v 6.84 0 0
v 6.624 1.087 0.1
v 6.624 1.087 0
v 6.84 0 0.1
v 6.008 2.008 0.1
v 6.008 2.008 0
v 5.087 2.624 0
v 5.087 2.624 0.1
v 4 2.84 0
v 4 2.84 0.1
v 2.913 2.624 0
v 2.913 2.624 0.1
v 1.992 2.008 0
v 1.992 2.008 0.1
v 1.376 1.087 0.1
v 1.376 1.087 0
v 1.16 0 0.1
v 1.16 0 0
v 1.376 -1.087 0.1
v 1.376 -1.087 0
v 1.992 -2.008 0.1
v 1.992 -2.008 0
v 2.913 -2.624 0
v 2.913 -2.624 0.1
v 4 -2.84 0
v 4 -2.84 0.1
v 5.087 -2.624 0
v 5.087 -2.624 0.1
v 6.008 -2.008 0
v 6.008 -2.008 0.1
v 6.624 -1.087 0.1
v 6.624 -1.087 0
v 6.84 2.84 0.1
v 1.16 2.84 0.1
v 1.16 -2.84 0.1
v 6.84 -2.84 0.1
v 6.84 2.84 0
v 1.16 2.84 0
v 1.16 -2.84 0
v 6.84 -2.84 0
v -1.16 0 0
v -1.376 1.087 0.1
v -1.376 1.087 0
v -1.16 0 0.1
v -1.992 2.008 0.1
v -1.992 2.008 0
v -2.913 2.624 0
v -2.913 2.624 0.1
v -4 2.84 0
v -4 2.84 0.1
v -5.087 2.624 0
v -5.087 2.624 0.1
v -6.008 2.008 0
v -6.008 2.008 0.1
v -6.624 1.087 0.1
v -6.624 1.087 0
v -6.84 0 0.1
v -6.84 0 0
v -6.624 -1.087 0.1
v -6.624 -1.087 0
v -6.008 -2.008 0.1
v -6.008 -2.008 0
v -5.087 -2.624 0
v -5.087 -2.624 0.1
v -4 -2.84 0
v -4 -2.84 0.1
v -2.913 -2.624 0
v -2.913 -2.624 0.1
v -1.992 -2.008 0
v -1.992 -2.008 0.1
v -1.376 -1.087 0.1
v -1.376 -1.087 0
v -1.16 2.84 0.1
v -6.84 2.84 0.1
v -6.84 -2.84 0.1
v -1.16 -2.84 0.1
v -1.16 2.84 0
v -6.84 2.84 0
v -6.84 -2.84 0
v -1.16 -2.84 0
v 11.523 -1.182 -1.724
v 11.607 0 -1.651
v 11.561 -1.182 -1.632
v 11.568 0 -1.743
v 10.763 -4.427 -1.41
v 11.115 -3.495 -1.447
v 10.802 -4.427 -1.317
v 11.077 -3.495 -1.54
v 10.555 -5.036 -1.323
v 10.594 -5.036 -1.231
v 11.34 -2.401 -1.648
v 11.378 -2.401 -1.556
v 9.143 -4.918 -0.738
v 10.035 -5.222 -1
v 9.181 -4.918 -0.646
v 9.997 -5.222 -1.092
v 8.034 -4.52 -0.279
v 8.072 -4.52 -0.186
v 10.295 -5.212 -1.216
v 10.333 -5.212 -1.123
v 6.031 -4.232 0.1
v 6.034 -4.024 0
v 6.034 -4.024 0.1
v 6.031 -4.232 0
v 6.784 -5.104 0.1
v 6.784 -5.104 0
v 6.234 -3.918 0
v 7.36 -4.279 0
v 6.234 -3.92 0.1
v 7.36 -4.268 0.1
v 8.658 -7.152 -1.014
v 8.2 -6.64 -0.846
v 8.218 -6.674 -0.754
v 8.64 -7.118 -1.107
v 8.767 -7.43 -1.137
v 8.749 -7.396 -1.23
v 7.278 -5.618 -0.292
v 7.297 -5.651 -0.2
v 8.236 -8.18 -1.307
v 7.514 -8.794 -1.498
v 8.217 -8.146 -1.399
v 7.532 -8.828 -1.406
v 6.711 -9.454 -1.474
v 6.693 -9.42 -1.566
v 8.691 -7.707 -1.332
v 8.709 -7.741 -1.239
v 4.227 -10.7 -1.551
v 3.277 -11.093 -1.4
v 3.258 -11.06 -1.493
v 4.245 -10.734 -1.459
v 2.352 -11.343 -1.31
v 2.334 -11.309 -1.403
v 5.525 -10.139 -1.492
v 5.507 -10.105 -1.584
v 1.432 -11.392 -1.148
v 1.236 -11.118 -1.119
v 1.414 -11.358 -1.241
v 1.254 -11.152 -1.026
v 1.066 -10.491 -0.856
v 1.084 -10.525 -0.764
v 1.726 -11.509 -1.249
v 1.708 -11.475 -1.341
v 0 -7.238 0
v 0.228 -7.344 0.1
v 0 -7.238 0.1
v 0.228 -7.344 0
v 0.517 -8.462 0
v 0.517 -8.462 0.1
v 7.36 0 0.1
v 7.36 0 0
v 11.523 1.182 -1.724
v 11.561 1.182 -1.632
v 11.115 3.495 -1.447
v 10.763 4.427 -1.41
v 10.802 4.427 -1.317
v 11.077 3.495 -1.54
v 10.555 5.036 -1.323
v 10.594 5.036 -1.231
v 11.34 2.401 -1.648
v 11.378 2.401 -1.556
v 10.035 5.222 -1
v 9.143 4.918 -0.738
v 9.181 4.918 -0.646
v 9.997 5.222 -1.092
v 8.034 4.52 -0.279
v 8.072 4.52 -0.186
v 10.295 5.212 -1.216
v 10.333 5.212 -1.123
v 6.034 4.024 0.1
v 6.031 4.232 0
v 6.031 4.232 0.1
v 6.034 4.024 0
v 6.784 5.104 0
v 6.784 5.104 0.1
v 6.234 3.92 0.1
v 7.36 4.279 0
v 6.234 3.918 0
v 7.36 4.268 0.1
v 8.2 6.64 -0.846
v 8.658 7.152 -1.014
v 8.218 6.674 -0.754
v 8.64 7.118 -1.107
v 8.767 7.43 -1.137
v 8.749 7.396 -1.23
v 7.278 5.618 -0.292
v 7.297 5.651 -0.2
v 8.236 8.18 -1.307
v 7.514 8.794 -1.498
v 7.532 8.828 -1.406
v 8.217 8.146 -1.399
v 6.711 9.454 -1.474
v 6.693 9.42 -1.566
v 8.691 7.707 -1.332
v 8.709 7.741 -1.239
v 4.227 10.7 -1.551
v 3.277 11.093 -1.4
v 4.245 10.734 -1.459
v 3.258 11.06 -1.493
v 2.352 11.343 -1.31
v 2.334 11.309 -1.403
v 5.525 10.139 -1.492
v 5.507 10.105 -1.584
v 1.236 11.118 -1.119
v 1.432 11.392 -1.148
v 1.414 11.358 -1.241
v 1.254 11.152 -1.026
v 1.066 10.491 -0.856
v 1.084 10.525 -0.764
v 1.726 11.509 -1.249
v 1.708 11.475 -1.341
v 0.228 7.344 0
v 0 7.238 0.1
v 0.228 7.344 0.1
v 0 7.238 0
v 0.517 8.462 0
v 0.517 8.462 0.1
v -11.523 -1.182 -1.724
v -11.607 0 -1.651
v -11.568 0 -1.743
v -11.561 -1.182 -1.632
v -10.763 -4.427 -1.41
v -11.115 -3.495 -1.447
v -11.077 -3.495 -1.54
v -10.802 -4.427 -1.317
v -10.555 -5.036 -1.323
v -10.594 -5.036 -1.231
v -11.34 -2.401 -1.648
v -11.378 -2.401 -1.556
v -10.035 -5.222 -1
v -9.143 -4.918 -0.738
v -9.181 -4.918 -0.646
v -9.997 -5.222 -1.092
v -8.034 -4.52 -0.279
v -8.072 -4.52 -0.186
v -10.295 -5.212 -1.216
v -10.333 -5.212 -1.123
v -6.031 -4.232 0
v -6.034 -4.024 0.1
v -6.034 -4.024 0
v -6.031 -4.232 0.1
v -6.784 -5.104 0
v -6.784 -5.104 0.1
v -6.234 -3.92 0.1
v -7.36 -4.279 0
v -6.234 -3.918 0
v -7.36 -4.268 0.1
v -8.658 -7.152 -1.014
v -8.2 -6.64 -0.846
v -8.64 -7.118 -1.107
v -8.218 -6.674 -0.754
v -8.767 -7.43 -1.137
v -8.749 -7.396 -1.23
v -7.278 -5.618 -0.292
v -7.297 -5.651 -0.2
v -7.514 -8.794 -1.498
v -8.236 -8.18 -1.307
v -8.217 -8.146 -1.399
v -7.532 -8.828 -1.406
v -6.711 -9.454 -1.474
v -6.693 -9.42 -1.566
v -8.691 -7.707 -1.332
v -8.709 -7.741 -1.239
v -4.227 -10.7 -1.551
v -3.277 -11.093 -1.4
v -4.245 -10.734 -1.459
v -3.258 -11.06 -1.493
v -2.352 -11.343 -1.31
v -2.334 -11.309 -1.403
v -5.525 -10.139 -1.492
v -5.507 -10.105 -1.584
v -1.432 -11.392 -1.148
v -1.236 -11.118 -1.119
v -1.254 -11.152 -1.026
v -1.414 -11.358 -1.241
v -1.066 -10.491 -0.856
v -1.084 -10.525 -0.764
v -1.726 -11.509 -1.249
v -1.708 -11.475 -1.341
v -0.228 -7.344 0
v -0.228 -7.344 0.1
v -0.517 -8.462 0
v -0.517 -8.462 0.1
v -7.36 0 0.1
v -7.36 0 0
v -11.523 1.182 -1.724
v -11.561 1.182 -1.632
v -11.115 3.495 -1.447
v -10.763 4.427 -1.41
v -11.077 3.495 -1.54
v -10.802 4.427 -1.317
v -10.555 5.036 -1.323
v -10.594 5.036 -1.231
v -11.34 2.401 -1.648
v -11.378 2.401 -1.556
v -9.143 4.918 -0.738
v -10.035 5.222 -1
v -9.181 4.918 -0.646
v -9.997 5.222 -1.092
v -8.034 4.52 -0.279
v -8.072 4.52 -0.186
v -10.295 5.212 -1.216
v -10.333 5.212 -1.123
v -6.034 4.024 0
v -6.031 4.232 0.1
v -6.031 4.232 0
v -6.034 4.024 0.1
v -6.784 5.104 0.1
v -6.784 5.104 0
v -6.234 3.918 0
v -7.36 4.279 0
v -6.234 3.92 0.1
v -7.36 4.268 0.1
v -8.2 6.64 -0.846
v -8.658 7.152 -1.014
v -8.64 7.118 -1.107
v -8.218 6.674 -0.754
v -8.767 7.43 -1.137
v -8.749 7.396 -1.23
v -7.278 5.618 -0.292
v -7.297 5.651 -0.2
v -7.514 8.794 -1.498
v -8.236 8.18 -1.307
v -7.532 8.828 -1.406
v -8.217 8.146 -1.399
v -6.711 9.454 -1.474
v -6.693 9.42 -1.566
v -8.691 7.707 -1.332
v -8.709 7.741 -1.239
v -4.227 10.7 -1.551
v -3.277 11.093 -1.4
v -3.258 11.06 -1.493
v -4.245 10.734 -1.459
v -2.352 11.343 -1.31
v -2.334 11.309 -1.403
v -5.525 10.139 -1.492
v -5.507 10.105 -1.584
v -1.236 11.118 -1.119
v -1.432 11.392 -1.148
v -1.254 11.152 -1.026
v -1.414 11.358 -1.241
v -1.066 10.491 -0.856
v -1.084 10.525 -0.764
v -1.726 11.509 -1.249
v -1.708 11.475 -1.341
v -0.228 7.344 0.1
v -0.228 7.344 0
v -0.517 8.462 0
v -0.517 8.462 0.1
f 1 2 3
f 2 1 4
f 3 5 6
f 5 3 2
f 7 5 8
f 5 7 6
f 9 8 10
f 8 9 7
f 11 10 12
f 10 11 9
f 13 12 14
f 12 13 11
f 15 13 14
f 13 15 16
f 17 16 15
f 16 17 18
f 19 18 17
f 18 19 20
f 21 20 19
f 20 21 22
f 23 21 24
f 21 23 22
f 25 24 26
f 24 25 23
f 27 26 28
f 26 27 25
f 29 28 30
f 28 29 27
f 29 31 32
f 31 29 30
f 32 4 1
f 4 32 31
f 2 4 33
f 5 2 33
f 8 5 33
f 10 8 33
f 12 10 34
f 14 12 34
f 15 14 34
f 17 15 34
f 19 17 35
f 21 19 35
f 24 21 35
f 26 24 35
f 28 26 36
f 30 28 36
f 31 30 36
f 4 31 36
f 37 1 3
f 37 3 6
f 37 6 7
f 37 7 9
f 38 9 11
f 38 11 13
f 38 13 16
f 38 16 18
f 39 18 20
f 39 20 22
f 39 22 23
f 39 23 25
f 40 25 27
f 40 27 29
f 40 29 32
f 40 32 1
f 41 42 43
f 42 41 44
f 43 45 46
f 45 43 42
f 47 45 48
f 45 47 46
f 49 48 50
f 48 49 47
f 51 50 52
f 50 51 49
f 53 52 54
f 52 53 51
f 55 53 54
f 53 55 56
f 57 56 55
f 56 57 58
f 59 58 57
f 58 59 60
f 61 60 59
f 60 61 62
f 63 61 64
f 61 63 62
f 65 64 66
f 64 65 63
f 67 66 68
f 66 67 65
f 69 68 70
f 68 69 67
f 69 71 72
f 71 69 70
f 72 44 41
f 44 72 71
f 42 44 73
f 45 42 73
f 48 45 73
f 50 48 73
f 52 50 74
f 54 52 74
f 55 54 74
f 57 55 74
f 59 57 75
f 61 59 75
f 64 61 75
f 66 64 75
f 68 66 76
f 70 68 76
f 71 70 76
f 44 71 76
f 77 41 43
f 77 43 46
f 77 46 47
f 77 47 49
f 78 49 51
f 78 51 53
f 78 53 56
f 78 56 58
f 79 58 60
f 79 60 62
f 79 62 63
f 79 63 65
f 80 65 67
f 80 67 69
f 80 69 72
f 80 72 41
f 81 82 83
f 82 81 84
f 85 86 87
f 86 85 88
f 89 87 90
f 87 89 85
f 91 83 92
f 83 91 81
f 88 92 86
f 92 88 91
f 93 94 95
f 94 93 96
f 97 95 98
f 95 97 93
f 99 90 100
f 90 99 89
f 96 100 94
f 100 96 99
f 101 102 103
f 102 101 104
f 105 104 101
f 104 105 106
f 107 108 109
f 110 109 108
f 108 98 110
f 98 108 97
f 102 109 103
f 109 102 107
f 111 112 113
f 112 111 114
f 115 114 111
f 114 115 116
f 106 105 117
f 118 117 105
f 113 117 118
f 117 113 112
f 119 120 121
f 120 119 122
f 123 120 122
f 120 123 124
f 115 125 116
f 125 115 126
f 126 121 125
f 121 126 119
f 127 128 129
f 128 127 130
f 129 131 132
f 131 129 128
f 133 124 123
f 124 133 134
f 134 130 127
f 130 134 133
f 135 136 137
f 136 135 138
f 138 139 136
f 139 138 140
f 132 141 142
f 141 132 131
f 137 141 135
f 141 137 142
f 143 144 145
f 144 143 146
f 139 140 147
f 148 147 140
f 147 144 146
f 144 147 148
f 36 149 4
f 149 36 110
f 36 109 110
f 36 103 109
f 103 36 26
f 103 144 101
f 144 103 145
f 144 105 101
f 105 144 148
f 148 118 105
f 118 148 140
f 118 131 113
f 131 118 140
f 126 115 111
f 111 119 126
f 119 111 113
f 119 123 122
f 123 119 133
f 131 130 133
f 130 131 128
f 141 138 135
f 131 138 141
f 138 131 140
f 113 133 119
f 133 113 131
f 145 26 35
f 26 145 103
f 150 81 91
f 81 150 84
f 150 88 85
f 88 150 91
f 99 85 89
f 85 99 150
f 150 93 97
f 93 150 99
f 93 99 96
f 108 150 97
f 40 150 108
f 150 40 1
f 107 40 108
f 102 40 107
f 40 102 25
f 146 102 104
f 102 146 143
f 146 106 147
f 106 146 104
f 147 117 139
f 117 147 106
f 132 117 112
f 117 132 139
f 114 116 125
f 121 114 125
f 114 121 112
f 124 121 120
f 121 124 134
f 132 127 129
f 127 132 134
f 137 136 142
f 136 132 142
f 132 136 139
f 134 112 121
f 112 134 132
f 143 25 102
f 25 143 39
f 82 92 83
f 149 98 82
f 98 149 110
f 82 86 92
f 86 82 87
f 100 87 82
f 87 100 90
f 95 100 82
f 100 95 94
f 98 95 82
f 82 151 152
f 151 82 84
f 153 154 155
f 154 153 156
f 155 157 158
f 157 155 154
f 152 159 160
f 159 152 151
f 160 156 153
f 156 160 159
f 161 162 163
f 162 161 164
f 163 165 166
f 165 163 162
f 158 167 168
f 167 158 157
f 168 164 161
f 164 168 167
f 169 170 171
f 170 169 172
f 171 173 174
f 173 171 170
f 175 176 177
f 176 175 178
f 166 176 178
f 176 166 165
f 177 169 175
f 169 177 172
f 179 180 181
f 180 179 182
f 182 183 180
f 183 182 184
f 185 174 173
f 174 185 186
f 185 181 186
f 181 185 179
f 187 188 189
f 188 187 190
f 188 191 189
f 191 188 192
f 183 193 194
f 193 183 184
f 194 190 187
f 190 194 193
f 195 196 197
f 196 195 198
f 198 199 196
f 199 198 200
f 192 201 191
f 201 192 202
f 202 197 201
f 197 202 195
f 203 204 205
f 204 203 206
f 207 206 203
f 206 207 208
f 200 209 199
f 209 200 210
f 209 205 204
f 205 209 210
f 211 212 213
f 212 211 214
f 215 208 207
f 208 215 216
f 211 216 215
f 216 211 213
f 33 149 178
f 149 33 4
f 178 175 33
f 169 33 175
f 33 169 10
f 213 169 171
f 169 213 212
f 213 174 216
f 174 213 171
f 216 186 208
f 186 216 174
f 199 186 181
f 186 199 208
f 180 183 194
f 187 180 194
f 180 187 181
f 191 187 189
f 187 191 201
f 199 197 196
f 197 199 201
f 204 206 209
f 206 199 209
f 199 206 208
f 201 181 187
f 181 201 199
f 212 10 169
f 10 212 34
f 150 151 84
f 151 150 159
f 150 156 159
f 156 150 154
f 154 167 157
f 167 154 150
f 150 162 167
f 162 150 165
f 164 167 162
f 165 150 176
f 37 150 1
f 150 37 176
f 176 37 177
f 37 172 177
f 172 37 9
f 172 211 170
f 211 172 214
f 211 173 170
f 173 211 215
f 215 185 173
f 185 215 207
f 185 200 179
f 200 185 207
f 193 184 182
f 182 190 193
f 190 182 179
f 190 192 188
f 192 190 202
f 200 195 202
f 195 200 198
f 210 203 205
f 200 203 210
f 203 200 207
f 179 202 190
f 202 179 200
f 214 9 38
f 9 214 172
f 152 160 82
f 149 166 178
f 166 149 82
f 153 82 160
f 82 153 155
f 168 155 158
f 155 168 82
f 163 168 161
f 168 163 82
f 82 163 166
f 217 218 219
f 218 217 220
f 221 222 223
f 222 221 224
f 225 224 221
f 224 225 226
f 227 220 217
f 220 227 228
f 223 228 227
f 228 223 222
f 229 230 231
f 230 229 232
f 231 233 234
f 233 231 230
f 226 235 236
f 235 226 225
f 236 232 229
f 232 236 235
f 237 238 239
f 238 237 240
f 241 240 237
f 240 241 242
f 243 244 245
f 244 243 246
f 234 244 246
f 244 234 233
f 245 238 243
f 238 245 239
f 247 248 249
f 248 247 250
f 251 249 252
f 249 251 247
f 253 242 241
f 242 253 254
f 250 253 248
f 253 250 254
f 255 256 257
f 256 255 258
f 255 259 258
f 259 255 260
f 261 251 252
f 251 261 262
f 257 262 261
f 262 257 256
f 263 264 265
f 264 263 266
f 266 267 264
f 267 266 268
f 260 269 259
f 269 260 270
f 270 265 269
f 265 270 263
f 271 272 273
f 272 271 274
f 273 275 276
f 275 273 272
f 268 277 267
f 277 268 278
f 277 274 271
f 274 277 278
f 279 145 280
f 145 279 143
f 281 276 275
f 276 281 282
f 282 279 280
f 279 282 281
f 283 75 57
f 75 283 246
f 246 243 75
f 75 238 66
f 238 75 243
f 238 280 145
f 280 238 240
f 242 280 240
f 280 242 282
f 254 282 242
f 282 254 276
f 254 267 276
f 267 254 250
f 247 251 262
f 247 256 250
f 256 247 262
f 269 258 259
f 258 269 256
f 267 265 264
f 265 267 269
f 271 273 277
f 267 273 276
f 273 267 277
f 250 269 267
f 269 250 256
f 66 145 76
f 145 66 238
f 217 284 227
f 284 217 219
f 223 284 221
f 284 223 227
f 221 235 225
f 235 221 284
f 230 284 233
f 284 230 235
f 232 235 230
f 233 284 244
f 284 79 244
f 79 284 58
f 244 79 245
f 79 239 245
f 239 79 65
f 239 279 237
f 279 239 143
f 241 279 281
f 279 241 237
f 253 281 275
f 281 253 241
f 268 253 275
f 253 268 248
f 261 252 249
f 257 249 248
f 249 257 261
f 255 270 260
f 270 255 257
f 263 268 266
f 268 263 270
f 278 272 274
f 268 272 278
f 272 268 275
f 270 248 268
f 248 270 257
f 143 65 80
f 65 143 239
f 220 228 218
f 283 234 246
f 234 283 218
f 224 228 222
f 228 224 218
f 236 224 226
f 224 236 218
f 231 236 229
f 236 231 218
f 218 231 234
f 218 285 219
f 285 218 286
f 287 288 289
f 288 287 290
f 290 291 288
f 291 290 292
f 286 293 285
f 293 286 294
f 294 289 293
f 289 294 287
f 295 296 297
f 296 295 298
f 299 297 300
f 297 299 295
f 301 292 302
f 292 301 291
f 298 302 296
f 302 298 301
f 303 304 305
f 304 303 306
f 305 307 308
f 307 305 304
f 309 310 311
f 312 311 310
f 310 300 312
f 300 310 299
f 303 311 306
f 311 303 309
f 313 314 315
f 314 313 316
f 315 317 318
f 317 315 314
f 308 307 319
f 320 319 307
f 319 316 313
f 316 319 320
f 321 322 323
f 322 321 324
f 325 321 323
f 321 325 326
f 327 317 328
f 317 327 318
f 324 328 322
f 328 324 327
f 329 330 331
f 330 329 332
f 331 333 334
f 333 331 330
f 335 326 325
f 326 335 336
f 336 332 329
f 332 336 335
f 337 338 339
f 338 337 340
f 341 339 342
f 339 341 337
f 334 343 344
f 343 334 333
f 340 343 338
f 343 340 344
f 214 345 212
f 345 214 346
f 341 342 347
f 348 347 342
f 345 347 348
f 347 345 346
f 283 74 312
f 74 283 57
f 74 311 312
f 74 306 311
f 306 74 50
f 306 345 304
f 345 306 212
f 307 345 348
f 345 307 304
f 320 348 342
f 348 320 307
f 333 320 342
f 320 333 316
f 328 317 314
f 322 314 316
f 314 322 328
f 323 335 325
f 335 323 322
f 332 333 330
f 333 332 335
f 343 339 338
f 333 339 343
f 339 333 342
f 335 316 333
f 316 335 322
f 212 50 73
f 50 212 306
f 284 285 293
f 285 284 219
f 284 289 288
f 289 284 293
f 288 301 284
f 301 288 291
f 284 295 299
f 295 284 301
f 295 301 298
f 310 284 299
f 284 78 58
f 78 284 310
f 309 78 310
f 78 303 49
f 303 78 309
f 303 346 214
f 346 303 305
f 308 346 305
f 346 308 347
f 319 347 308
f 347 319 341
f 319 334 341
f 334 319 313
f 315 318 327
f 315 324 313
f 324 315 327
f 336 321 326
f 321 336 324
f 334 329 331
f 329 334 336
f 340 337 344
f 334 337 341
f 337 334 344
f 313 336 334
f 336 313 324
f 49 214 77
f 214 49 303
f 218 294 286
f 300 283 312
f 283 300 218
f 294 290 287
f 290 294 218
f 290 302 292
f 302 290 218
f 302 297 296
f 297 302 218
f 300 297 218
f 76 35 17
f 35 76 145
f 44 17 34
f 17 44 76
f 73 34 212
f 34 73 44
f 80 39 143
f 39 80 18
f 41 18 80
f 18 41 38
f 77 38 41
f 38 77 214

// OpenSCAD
// file: ../p/4-4edge.scad
use <../lib.scad>
function ldraw_lib__4_4edge() = [
// 0 Circle 1.0
// 0 Name: 4-4edge.dat
// 0 Author: James Jessiman
// 0 !LDRAW_ORG Primitive UPDATE 2017-01
// 0 !LICENSE Licensed under CC BY 4.0 : see CAreadme.txt
// 
// 0 BFC CERTIFY CCW
  [0,"BFC","CERTIFY"],
  [0,"BFC","CCW"],
// 
// 0 !HISTORY 1998-12-15 [PTadmin] Official Update 1998-10
// 0 !HISTORY 2005-12-28 [PTadmin] Official Update 2005-01
// 0 !HISTORY 2007-06-24 [PTadmin] Header formatted for Contributor Agreement
// 0 !HISTORY 2008-07-01 [PTadmin] Official Update 2008-01
// 0 !HISTORY 2017-01-15 [Steffen] BFCed
// 0 !HISTORY 2017-12-30 [PTadmin] Official Update 2017-01
// 
// 
// 2 24 1 0 0 0.9239 0 0.3827
  [2,24,1,0,0,0.9239,0,0.3827],
// 2 24 0.9239 0 0.3827 0.7071 0 0.7071
  [2,24,0.9239,0,0.3827,0.7071,0,0.7071],
// 2 24 0.7071 0 0.7071 0.3827 0 0.9239
  [2,24,0.7071,0,0.7071,0.3827,0,0.9239],
// 2 24 0.3827 0 0.9239 0 0 1
  [2,24,0.3827,0,0.9239,0,0,1],
// 2 24 0 0 1 -0.3827 0 0.9239
  [2,24,0,0,1,-0.3827,0,0.9239],
// 2 24 -0.3827 0 0.9239 -0.7071 0 0.7071
  [2,24,-0.3827,0,0.9239,-0.7071,0,0.7071],
// 2 24 -0.7071 0 0.7071 -0.9239 0 0.3827
  [2,24,-0.7071,0,0.7071,-0.9239,0,0.3827],
// 2 24 -0.9239 0 0.3827 -1 0 -0
  [2,24,-0.9239,0,0.3827,-1,0,-0],
// 2 24 -1 0 -0 -0.9239 0 -0.3827
  [2,24,-1,0,-0,-0.9239,0,-0.3827],
// 2 24 -0.9239 0 -0.3827 -0.7071 0 -0.7071
  [2,24,-0.9239,0,-0.3827,-0.7071,0,-0.7071],
// 2 24 -0.7071 0 -0.7071 -0.3827 0 -0.9239
  [2,24,-0.7071,0,-0.7071,-0.3827,0,-0.9239],
// 2 24 -0.3827 0 -0.9239 0 0 -1
  [2,24,-0.3827,0,-0.9239,0,0,-1],
// 2 24 0 0 -1 0.3827 0 -0.9239
  [2,24,0,0,-1,0.3827,0,-0.9239],
// 2 24 0.3827 0 -0.9239 0.7071 0 -0.7071
  [2,24,0.3827,0,-0.9239,0.7071,0,-0.7071],
// 2 24 0.7071 0 -0.7071 0.9239 0 -0.3827
  [2,24,0.7071,0,-0.7071,0.9239,0,-0.3827],
// 2 24 0.9239 0 -0.3827 1 0 0
  [2,24,0.9239,0,-0.3827,1,0,0],
];
module ldraw_lib__4_4edge(step=0, col=false, unit=2/5, alt=false, line=0.2, solid=!$preview)
    makepoly(ldraw_lib__4_4edge(), step=step, col=col, unit=unit, alt=alt, line=line, solid=solid);
ldraw_lib__4_4edge(line=0.2);
// file: ../p/4-4cyli.scad
use <../lib.scad>
function ldraw_lib__4_4cyli() = [
// 0 Cylinder 1.0
// 0 Name: 4-4cyli.dat
// 0 Author: James Jessiman
// 0 !LDRAW_ORG Primitive UPDATE 2005-01
// 0 !LICENSE Licensed under CC BY 4.0 : see CAreadme.txt
// 
// 0 BFC CERTIFY CCW
  [0,"BFC","CERTIFY"],
  [0,"BFC","CCW"],
// 
// 0 !HISTORY 1998-12-15 [PTadmin] Official Update 1998-10
// 0 !HISTORY 2002-03-23 [sbliss] Added BFC statement; merged headers from files in distributions LDraw 0.27 and Complete.
// 0 !HISTORY 2002-04-25 [PTadmin] Official Update 2002-02
// 0 !HISTORY 2004-12-14 [guyvivan] BFC CCW
// 0 !HISTORY 2005-12-28 [PTadmin] Official Update 2005-01
// 0 !HISTORY 2007-06-24 [PTadmin] Header formatted for Contributor Agreement
// 0 !HISTORY 2008-07-01 [PTadmin] Official Update 2008-01
// 
// 
// 4 16 1 1 0 0.9239 1 0.3827 0.9239 0 0.3827 1 0 0
  [4,16,1,1,0,0.9239,1,0.3827,0.9239,0,0.3827,1,0,0],
// 5 24 1 0 0 1 1 0 0.9239 0 0.3827 0.9239 0 -0.3827
  [5,24,1,0,0,1,1,0,0.9239,0,0.3827,0.9239,0,-0.3827],
// 4 16 0.9239 1 0.3827 0.7071 1 0.7071 0.7071 0 0.7071 0.9239 0 0.3827
  [4,16,0.9239,1,0.3827,0.7071,1,0.7071,0.7071,0,0.7071,0.9239,0,0.3827],
// 5 24 0.9239 0 0.3827 0.9239 1 0.3827 0.7071 0 0.7071 1 0 0
  [5,24,0.9239,0,0.3827,0.9239,1,0.3827,0.7071,0,0.7071,1,0,0],
// 4 16 0.7071 1 0.7071 0.3827 1 0.9239 0.3827 0 0.9239 0.7071 0 0.7071
  [4,16,0.7071,1,0.7071,0.3827,1,0.9239,0.3827,0,0.9239,0.7071,0,0.7071],
// 5 24 0.7071 0 0.7071 0.7071 1 0.7071 0.3827 0 0.9239 0.9239 0 0.3827
  [5,24,0.7071,0,0.7071,0.7071,1,0.7071,0.3827,0,0.9239,0.9239,0,0.3827],
// 4 16 0.3827 1 0.9239 0 1 1 0 0 1 0.3827 0 0.9239
  [4,16,0.3827,1,0.9239,0,1,1,0,0,1,0.3827,0,0.9239],
// 5 24 0.3827 0 0.9239 0.3827 1 0.9239 0 0 1 0.7071 0 0.7071
  [5,24,0.3827,0,0.9239,0.3827,1,0.9239,0,0,1,0.7071,0,0.7071],
// 4 16 0 1 1 -0.3827 1 0.9239 -0.3827 0 0.9239 0 0 1
  [4,16,0,1,1,-0.3827,1,0.9239,-0.3827,0,0.9239,0,0,1],
// 5 24 0 0 1 0 1 1 -0.3827 0 0.9239 0.3827 0 0.9239
  [5,24,0,0,1,0,1,1,-0.3827,0,0.9239,0.3827,0,0.9239],
// 4 16 -0.3827 1 0.9239 -0.7071 1 0.7071 -0.7071 0 0.7071 -0.3827 0 0.9239
  [4,16,-0.3827,1,0.9239,-0.7071,1,0.7071,-0.7071,0,0.7071,-0.3827,0,0.9239],
// 5 24 -0.3827 0 0.9239 -0.3827 1 0.9239 -0.7071 0 0.7071 0 0 1
  [5,24,-0.3827,0,0.9239,-0.3827,1,0.9239,-0.7071,0,0.7071,0,0,1],
// 4 16 -0.7071 1 0.7071 -0.9239 1 0.3827 -0.9239 0 0.3827 -0.7071 0 0.7071
  [4,16,-0.7071,1,0.7071,-0.9239,1,0.3827,-0.9239,0,0.3827,-0.7071,0,0.7071],
// 5 24 -0.7071 0 0.7071 -0.7071 1 0.7071 -0.9239 0 0.3827 -0.3827 0 0.9239
  [5,24,-0.7071,0,0.7071,-0.7071,1,0.7071,-0.9239,0,0.3827,-0.3827,0,0.9239],
// 4 16 -0.9239 1 0.3827 -1 1 0 -1 0 0 -0.9239 0 0.3827
  [4,16,-0.9239,1,0.3827,-1,1,0,-1,0,0,-0.9239,0,0.3827],
// 5 24 -0.9239 0 0.3827 -0.9239 1 0.3827 -1 0 0 -0.7071 0 0.7071
  [5,24,-0.9239,0,0.3827,-0.9239,1,0.3827,-1,0,0,-0.7071,0,0.7071],
// 4 16 -1 1 0 -0.9239 1 -0.3827 -0.9239 0 -0.3827 -1 0 0
  [4,16,-1,1,0,-0.9239,1,-0.3827,-0.9239,0,-0.3827,-1,0,0],
// 5 24 -1 0 0 -1 1 0 -0.9239 0 -0.3827 -0.9239 0 0.3827
  [5,24,-1,0,0,-1,1,0,-0.9239,0,-0.3827,-0.9239,0,0.3827],
// 4 16 -0.9239 1 -0.3827 -0.7071 1 -0.7071 -0.7071 0 -0.7071 -0.9239 0 -0.3827
  [4,16,-0.9239,1,-0.3827,-0.7071,1,-0.7071,-0.7071,0,-0.7071,-0.9239,0,-0.3827],
// 5 24 -0.9239 0 -0.3827 -0.9239 1 -0.3827 -0.7071 0 -0.7071 -1 0 0
  [5,24,-0.9239,0,-0.3827,-0.9239,1,-0.3827,-0.7071,0,-0.7071,-1,0,0],
// 4 16 -0.7071 1 -0.7071 -0.3827 1 -0.9239 -0.3827 0 -0.9239 -0.7071 0 -0.7071
  [4,16,-0.7071,1,-0.7071,-0.3827,1,-0.9239,-0.3827,0,-0.9239,-0.7071,0,-0.7071],
// 5 24 -0.7071 0 -0.7071 -0.7071 1 -0.7071 -0.3827 0 -0.9239 -0.9239 0 -0.3827
  [5,24,-0.7071,0,-0.7071,-0.7071,1,-0.7071,-0.3827,0,-0.9239,-0.9239,0,-0.3827],
// 4 16 -0.3827 1 -0.9239 0 1 -1 0 0 -1 -0.3827 0 -0.9239
  [4,16,-0.3827,1,-0.9239,0,1,-1,0,0,-1,-0.3827,0,-0.9239],
// 5 24 -0.3827 0 -0.9239 -0.3827 1 -0.9239 0 0 -1 -0.7071 0 -0.7071
  [5,24,-0.3827,0,-0.9239,-0.3827,1,-0.9239,0,0,-1,-0.7071,0,-0.7071],
// 4 16 0 1 -1 0.3827 1 -0.9239 0.3827 0 -0.9239 0 0 -1
  [4,16,0,1,-1,0.3827,1,-0.9239,0.3827,0,-0.9239,0,0,-1],
// 5 24 0 0 -1 0 1 -1 0.3827 0 -0.9239 -0.3827 0 -0.9239
  [5,24,0,0,-1,0,1,-1,0.3827,0,-0.9239,-0.3827,0,-0.9239],
// 4 16 0.3827 1 -0.9239 0.7071 1 -0.7071 0.7071 0 -0.7071 0.3827 0 -0.9239
  [4,16,0.3827,1,-0.9239,0.7071,1,-0.7071,0.7071,0,-0.7071,0.3827,0,-0.9239],
// 5 24 0.3827 0 -0.9239 0.3827 1 -0.9239 0.7071 0 -0.7071 0 0 -1
  [5,24,0.3827,0,-0.9239,0.3827,1,-0.9239,0.7071,0,-0.7071,0,0,-1],
// 4 16 0.7071 1 -0.7071 0.9239 1 -0.3827 0.9239 0 -0.3827 0.7071 0 -0.7071
  [4,16,0.7071,1,-0.7071,0.9239,1,-0.3827,0.9239,0,-0.3827,0.7071,0,-0.7071],
// 5 24 0.7071 0 -0.7071 0.7071 1 -0.7071 0.9239 0 -0.3827 0.3827 0 -0.9239
  [5,24,0.7071,0,-0.7071,0.7071,1,-0.7071,0.9239,0,-0.3827,0.3827,0,-0.9239],
// 4 16 0.9239 1 -0.3827 1 1 0 1 0 0 0.9239 0 -0.3827
  [4,16,0.9239,1,-0.3827,1,1,0,1,0,0,0.9239,0,-0.3827],
// 5 24 0.9239 0 -0.3827 0.9239 1 -0.3827 1 0 0 0.7071 0 -0.7071
  [5,24,0.9239,0,-0.3827,0.9239,1,-0.3827,1,0,0,0.7071,0,-0.7071],
// 0
];
module ldraw_lib__4_4cyli(step=0, col=false, unit=2/5, alt=false, line=0.2, solid=!$preview)
    makepoly(ldraw_lib__4_4cyli(), step=step, col=col, unit=unit, alt=alt, line=line, solid=solid);
ldraw_lib__4_4cyli(line=0.2);
// file: ../p/4-4ndis.scad
use <../lib.scad>
function ldraw_lib__4_4ndis() = [
// 0 Disc Negative 1.0
// 0 Name: 4-4ndis.dat
// 0 Author: James Jessiman
// 0 !LDRAW_ORG Primitive UPDATE 2012-01
// 0 !LICENSE Licensed under CC BY 4.0 : see CAreadme.txt
// 
// 0 BFC CERTIFY CCW
  [0,"BFC","CERTIFY"],
  [0,"BFC","CCW"],
// 
// 0 !HISTORY 2002-03-23 [sbliss] Added BFC statement; compacted code
// 0 !HISTORY 2002-04-25 [PTadmin] Official Update 2002-02
// 0 !HISTORY 2007-06-24 [PTadmin] Header formatted for Contributor Agreement
// 0 !HISTORY 2008-07-01 [PTadmin] Official Update 2008-01
// 0 !HISTORY 2012-02-16 [Philo] Changed to CCW
// 0 !HISTORY 2012-03-30 [PTadmin] Official Update 2012-01
// 
// 
// 3 16 0.9239 0 0.3827 1 0 0 1 0 1
  [3,16,0.9239,0,0.3827,1,0,0,1,0,1],
// 3 16 0.7071 0 0.7071 0.9239 0 0.3827 1 0 1
  [3,16,0.7071,0,0.7071,0.9239,0,0.3827,1,0,1],
// 3 16 0.3827 0 0.9239 0.7071 0 0.7071 1 0 1
  [3,16,0.3827,0,0.9239,0.7071,0,0.7071,1,0,1],
// 3 16 0 0 1 0.3827 0 0.9239 1 0 1
  [3,16,0,0,1,0.3827,0,0.9239,1,0,1],
// 3 16 -0.3827 0 0.9239 0 0 1 -1 0 1
  [3,16,-0.3827,0,0.9239,0,0,1,-1,0,1],
// 3 16 -0.7071 0 0.7071 -0.3827 0 0.9239 -1 0 1
  [3,16,-0.7071,0,0.7071,-0.3827,0,0.9239,-1,0,1],
// 3 16 -0.9239 0 0.3827 -0.7071 0 0.7071 -1 0 1
  [3,16,-0.9239,0,0.3827,-0.7071,0,0.7071,-1,0,1],
// 3 16 -1 0 0 -0.9239 0 0.3827 -1 0 1
  [3,16,-1,0,0,-0.9239,0,0.3827,-1,0,1],
// 3 16 -0.9239 0 -0.3827 -1 0 0 -1 0 -1
  [3,16,-0.9239,0,-0.3827,-1,0,0,-1,0,-1],
// 3 16 -0.7071 0 -0.7071 -0.9239 0 -0.3827 -1 0 -1
  [3,16,-0.7071,0,-0.7071,-0.9239,0,-0.3827,-1,0,-1],
// 3 16 -0.3827 0 -0.9239 -0.7071 0 -0.7071 -1 0 -1
  [3,16,-0.3827,0,-0.9239,-0.7071,0,-0.7071,-1,0,-1],
// 3 16 0 0 -1 -0.3827 0 -0.9239 -1 0 -1
  [3,16,0,0,-1,-0.3827,0,-0.9239,-1,0,-1],
// 3 16 0.3827 0 -0.9239 0 0 -1 1 0 -1
  [3,16,0.3827,0,-0.9239,0,0,-1,1,0,-1],
// 3 16 0.7071 0 -0.7071 0.3827 0 -0.9239 1 0 -1
  [3,16,0.7071,0,-0.7071,0.3827,0,-0.9239,1,0,-1],
// 3 16 0.9239 0 -0.3827 0.7071 0 -0.7071 1 0 -1
  [3,16,0.9239,0,-0.3827,0.7071,0,-0.7071,1,0,-1],
// 3 16 1 0 0 0.9239 0 -0.3827 1 0 -1
  [3,16,1,0,0,0.9239,0,-0.3827,1,0,-1],
];
module ldraw_lib__4_4ndis(step=0, col=false, unit=2/5, alt=false, line=0.2, solid=!$preview)
    makepoly(ldraw_lib__4_4ndis(), step=step, col=col, unit=unit, alt=alt, line=line, solid=solid);
ldraw_lib__4_4ndis(line=0.2);
// file: ../p/4-4cylo.scad
use <../lib.scad>
use <4-4cyli.scad>
use <4-4edge.scad>
function ldraw_lib__4_4cylo() = [
// 0 Cylinder Open 1.0
// 0 Name: 4-4cylo.dat
// 0 Author: Mark Kennedy [mkennedy]
// 0 !LDRAW_ORG Primitive UPDATE 2010-01
// 0 !LICENSE Licensed under CC BY 4.0 : see CAreadme.txt
// 
// 0 BFC CERTIFY CCW
  [0,"BFC","CERTIFY"],
  [0,"BFC","CCW"],
// 
// 0 !HISTORY 2010-04-05 [PTadmin] Official Update 2010-01
// 
// 
// 1 16 0 0 0 1 0 0 0 1 0 0 0 1 4-4edge.dat
  [1,16,0,0,0,1,0,0,0,1,0,0,0,1, ldraw_lib__4_4edge()],
// 1 16 0 1 0 1 0 0 0 1 0 0 0 1 4-4edge.dat
  [1,16,0,1,0,1,0,0,0,1,0,0,0,1, ldraw_lib__4_4edge()],
// 1 16 0 0 0 1 0 0 0 1 0 0 0 1 4-4cyli.dat
  [1,16,0,0,0,1,0,0,0,1,0,0,0,1, ldraw_lib__4_4cyli()],
// 0
];
module ldraw_lib__4_4cylo(step=0, col=false, unit=2/5, alt=false, line=0.2, solid=!$preview)
    makepoly(ldraw_lib__4_4cylo(), step=step, col=col, unit=unit, alt=alt, line=line, solid=solid);
ldraw_lib__4_4cylo(line=0.2);
// main file
use <../lib.scad>
use <../p/4-4cylo.scad>
use <../p/4-4ndis.scad>
use <s/75674c01s01.scad>
function ldraw_lib__75674c01() = [
// 0 Minifig Skirt Round Roman (Formed)
// 0 Name: 75674c01.dat
// 0 Author: Magnus Forsberg [MagFors]
// 0 !LDRAW_ORG Part UPDATE 2026-07
// 0 !LICENSE Licensed under CC BY 4.0 : see CAreadme.txt
// 
// 0 BFC CERTIFY CCW
  [0,"BFC","CERTIFY"],
  [0,"BFC","CCW"],
// 
// 0 !CATEGORY Minifig Hipwear
// 0 !KEYWORDS Bricklink 75674, Brickowl 79053, Brickset 75674, CMF, Looney Tunes
// 0 !KEYWORDS Marvin the Martian, Rebrickable 75674, Set 71030
// 
// 0 !HISTORY 2026-07-30 [OrionP] Official Update 2026-07
// 
// 0 BFC INVERTNEXT
  [0,"BFC","INVERTNEXT"],
// 1 16 10 -.25 0 7.1 0 0 0 .25 0 0 0 7.1 4-4cylo.dat
  [1,16,10,-.25,0,7.1,0,0,0,.25,0,0,0,7.1, ldraw_lib__4_4cylo()],
// 1 16 10 -.25 0 7.1 0 0 0 1 0 0 0 7.1 4-4ndis.dat
  [1,16,10,-.25,0,7.1,0,0,0,1,0,0,0,7.1, ldraw_lib__4_4ndis()],
// 1 16 10 0 0 7.1 0 0 0 -1 0 0 0 7.1 4-4ndis.dat
  [1,16,10,0,0,7.1,0,0,0,-1,0,0,0,7.1, ldraw_lib__4_4ndis()],
// 0 BFC INVERTNEXT
  [0,"BFC","INVERTNEXT"],
// 1 16 -10 -.25 0 7.1 0 0 0 .25 0 0 0 7.1 4-4cylo.dat
  [1,16,-10,-.25,0,7.1,0,0,0,.25,0,0,0,7.1, ldraw_lib__4_4cylo()],
// 1 16 -10 -.25 0 7.1 0 0 0 1 0 0 0 7.1 4-4ndis.dat
  [1,16,-10,-.25,0,7.1,0,0,0,1,0,0,0,7.1, ldraw_lib__4_4ndis()],
// 1 16 -10 0 0 7.1 0 0 0 -1 0 0 0 7.1 4-4ndis.dat
  [1,16,-10,0,0,7.1,0,0,0,-1,0,0,0,7.1, ldraw_lib__4_4ndis()],
// 1 16 0 0 0 1 0 0 0 1 0 0 0 1 s\75674c01s01.dat
  [1,16,0,0,0,1,0,0,0,1,0,0,0,1, ldraw_lib__s__75674c01s01()],
// 1 16 0 0 0 1 0 0 0 1 0 0 0 -1 s\75674c01s01.dat
  [1,16,0,0,0,1,0,0,0,1,0,0,0,-1, ldraw_lib__s__75674c01s01()],
// 1 16 0 0 0 -1 0 0 0 1 0 0 0 1 s\75674c01s01.dat
  [1,16,0,0,0,-1,0,0,0,1,0,0,0,1, ldraw_lib__s__75674c01s01()],
// 1 16 0 0 0 -1 0 0 0 1 0 0 0 -1 s\75674c01s01.dat
  [1,16,0,0,0,-1,0,0,0,1,0,0,0,-1, ldraw_lib__s__75674c01s01()],
// 4 16 0 -.25 -18.094 2.9 -.25 -7.1 2.9 -.25 0 -2.9 -.25 -7.1
  [4,16,0,-.25,-18.094,2.9,-.25,-7.1,2.9,-.25,0,-2.9,-.25,-7.1],
// 4 16 -2.9 -.25 0 -2.9 -.25 -7.1 2.9 -.25 0 2.9 -.25 7.1
  [4,16,-2.9,-.25,0,-2.9,-.25,-7.1,2.9,-.25,0,2.9,-.25,7.1],
// 4 16 2.9 -.25 7.1 0 -.25 18.094 -2.9 -.25 7.1 -2.9 -.25 0
  [4,16,2.9,-.25,7.1,0,-.25,18.094,-2.9,-.25,7.1,-2.9,-.25,0],
// 4 16 2.9 0 0 2.9 0 -7.1 0 0 -18.094 -2.9 0 -7.1
  [4,16,2.9,0,0,2.9,0,-7.1,0,0,-18.094,-2.9,0,-7.1],
// 4 16 2.9 0 0 -2.9 0 -7.1 -2.9 0 0 2.9 0 7.1
  [4,16,2.9,0,0,-2.9,0,-7.1,-2.9,0,0,2.9,0,7.1],
// 4 16 -2.9 0 7.1 0 0 18.094 2.9 0 7.1 -2.9 0 0
  [4,16,-2.9,0,7.1,0,0,18.094,2.9,0,7.1,-2.9,0,0],
// 5 24 0 -.25 -18.094 0 0 -18.094 -.57 -.25 -18.359 .57 -.25 -18.359
  [5,24,0,-.25,-18.094,0,0,-18.094,-.57,-.25,-18.359,.57,-.25,-18.359],
// 5 24 29.017 4.127 0 28.921 4.358 0 28.902 4.079 -2.956 28.902 4.079 2.956
  [5,24,29.017,4.127,0,28.921,4.358,0,28.902,4.079,-2.956,28.902,4.079,2.956],
// 5 24 0 -.25 18.094 0 0 18.094 .57 -.25 18.359 -.57 -.25 18.359
  [5,24,0,-.25,18.094,0,0,18.094,.57,-.25,18.359,-.57,-.25,18.359],
// 5 24 -29.017 4.127 0 -28.921 4.358 0 -28.902 4.079 2.956 -28.902 4.079 -2.956
  [5,24,-29.017,4.127,0,-28.921,4.358,0,-28.902,4.079,2.956,-28.902,4.079,-2.956],
];
module ldraw_lib__75674c01(step=0, col=false, unit=2/5, alt=false, line=0.2, solid=!$preview)
    makepoly(ldraw_lib__75674c01(), step=step, col=col, unit=unit, alt=alt, line=line, solid=solid);
ldraw_lib__75674c01(line=0.2);
